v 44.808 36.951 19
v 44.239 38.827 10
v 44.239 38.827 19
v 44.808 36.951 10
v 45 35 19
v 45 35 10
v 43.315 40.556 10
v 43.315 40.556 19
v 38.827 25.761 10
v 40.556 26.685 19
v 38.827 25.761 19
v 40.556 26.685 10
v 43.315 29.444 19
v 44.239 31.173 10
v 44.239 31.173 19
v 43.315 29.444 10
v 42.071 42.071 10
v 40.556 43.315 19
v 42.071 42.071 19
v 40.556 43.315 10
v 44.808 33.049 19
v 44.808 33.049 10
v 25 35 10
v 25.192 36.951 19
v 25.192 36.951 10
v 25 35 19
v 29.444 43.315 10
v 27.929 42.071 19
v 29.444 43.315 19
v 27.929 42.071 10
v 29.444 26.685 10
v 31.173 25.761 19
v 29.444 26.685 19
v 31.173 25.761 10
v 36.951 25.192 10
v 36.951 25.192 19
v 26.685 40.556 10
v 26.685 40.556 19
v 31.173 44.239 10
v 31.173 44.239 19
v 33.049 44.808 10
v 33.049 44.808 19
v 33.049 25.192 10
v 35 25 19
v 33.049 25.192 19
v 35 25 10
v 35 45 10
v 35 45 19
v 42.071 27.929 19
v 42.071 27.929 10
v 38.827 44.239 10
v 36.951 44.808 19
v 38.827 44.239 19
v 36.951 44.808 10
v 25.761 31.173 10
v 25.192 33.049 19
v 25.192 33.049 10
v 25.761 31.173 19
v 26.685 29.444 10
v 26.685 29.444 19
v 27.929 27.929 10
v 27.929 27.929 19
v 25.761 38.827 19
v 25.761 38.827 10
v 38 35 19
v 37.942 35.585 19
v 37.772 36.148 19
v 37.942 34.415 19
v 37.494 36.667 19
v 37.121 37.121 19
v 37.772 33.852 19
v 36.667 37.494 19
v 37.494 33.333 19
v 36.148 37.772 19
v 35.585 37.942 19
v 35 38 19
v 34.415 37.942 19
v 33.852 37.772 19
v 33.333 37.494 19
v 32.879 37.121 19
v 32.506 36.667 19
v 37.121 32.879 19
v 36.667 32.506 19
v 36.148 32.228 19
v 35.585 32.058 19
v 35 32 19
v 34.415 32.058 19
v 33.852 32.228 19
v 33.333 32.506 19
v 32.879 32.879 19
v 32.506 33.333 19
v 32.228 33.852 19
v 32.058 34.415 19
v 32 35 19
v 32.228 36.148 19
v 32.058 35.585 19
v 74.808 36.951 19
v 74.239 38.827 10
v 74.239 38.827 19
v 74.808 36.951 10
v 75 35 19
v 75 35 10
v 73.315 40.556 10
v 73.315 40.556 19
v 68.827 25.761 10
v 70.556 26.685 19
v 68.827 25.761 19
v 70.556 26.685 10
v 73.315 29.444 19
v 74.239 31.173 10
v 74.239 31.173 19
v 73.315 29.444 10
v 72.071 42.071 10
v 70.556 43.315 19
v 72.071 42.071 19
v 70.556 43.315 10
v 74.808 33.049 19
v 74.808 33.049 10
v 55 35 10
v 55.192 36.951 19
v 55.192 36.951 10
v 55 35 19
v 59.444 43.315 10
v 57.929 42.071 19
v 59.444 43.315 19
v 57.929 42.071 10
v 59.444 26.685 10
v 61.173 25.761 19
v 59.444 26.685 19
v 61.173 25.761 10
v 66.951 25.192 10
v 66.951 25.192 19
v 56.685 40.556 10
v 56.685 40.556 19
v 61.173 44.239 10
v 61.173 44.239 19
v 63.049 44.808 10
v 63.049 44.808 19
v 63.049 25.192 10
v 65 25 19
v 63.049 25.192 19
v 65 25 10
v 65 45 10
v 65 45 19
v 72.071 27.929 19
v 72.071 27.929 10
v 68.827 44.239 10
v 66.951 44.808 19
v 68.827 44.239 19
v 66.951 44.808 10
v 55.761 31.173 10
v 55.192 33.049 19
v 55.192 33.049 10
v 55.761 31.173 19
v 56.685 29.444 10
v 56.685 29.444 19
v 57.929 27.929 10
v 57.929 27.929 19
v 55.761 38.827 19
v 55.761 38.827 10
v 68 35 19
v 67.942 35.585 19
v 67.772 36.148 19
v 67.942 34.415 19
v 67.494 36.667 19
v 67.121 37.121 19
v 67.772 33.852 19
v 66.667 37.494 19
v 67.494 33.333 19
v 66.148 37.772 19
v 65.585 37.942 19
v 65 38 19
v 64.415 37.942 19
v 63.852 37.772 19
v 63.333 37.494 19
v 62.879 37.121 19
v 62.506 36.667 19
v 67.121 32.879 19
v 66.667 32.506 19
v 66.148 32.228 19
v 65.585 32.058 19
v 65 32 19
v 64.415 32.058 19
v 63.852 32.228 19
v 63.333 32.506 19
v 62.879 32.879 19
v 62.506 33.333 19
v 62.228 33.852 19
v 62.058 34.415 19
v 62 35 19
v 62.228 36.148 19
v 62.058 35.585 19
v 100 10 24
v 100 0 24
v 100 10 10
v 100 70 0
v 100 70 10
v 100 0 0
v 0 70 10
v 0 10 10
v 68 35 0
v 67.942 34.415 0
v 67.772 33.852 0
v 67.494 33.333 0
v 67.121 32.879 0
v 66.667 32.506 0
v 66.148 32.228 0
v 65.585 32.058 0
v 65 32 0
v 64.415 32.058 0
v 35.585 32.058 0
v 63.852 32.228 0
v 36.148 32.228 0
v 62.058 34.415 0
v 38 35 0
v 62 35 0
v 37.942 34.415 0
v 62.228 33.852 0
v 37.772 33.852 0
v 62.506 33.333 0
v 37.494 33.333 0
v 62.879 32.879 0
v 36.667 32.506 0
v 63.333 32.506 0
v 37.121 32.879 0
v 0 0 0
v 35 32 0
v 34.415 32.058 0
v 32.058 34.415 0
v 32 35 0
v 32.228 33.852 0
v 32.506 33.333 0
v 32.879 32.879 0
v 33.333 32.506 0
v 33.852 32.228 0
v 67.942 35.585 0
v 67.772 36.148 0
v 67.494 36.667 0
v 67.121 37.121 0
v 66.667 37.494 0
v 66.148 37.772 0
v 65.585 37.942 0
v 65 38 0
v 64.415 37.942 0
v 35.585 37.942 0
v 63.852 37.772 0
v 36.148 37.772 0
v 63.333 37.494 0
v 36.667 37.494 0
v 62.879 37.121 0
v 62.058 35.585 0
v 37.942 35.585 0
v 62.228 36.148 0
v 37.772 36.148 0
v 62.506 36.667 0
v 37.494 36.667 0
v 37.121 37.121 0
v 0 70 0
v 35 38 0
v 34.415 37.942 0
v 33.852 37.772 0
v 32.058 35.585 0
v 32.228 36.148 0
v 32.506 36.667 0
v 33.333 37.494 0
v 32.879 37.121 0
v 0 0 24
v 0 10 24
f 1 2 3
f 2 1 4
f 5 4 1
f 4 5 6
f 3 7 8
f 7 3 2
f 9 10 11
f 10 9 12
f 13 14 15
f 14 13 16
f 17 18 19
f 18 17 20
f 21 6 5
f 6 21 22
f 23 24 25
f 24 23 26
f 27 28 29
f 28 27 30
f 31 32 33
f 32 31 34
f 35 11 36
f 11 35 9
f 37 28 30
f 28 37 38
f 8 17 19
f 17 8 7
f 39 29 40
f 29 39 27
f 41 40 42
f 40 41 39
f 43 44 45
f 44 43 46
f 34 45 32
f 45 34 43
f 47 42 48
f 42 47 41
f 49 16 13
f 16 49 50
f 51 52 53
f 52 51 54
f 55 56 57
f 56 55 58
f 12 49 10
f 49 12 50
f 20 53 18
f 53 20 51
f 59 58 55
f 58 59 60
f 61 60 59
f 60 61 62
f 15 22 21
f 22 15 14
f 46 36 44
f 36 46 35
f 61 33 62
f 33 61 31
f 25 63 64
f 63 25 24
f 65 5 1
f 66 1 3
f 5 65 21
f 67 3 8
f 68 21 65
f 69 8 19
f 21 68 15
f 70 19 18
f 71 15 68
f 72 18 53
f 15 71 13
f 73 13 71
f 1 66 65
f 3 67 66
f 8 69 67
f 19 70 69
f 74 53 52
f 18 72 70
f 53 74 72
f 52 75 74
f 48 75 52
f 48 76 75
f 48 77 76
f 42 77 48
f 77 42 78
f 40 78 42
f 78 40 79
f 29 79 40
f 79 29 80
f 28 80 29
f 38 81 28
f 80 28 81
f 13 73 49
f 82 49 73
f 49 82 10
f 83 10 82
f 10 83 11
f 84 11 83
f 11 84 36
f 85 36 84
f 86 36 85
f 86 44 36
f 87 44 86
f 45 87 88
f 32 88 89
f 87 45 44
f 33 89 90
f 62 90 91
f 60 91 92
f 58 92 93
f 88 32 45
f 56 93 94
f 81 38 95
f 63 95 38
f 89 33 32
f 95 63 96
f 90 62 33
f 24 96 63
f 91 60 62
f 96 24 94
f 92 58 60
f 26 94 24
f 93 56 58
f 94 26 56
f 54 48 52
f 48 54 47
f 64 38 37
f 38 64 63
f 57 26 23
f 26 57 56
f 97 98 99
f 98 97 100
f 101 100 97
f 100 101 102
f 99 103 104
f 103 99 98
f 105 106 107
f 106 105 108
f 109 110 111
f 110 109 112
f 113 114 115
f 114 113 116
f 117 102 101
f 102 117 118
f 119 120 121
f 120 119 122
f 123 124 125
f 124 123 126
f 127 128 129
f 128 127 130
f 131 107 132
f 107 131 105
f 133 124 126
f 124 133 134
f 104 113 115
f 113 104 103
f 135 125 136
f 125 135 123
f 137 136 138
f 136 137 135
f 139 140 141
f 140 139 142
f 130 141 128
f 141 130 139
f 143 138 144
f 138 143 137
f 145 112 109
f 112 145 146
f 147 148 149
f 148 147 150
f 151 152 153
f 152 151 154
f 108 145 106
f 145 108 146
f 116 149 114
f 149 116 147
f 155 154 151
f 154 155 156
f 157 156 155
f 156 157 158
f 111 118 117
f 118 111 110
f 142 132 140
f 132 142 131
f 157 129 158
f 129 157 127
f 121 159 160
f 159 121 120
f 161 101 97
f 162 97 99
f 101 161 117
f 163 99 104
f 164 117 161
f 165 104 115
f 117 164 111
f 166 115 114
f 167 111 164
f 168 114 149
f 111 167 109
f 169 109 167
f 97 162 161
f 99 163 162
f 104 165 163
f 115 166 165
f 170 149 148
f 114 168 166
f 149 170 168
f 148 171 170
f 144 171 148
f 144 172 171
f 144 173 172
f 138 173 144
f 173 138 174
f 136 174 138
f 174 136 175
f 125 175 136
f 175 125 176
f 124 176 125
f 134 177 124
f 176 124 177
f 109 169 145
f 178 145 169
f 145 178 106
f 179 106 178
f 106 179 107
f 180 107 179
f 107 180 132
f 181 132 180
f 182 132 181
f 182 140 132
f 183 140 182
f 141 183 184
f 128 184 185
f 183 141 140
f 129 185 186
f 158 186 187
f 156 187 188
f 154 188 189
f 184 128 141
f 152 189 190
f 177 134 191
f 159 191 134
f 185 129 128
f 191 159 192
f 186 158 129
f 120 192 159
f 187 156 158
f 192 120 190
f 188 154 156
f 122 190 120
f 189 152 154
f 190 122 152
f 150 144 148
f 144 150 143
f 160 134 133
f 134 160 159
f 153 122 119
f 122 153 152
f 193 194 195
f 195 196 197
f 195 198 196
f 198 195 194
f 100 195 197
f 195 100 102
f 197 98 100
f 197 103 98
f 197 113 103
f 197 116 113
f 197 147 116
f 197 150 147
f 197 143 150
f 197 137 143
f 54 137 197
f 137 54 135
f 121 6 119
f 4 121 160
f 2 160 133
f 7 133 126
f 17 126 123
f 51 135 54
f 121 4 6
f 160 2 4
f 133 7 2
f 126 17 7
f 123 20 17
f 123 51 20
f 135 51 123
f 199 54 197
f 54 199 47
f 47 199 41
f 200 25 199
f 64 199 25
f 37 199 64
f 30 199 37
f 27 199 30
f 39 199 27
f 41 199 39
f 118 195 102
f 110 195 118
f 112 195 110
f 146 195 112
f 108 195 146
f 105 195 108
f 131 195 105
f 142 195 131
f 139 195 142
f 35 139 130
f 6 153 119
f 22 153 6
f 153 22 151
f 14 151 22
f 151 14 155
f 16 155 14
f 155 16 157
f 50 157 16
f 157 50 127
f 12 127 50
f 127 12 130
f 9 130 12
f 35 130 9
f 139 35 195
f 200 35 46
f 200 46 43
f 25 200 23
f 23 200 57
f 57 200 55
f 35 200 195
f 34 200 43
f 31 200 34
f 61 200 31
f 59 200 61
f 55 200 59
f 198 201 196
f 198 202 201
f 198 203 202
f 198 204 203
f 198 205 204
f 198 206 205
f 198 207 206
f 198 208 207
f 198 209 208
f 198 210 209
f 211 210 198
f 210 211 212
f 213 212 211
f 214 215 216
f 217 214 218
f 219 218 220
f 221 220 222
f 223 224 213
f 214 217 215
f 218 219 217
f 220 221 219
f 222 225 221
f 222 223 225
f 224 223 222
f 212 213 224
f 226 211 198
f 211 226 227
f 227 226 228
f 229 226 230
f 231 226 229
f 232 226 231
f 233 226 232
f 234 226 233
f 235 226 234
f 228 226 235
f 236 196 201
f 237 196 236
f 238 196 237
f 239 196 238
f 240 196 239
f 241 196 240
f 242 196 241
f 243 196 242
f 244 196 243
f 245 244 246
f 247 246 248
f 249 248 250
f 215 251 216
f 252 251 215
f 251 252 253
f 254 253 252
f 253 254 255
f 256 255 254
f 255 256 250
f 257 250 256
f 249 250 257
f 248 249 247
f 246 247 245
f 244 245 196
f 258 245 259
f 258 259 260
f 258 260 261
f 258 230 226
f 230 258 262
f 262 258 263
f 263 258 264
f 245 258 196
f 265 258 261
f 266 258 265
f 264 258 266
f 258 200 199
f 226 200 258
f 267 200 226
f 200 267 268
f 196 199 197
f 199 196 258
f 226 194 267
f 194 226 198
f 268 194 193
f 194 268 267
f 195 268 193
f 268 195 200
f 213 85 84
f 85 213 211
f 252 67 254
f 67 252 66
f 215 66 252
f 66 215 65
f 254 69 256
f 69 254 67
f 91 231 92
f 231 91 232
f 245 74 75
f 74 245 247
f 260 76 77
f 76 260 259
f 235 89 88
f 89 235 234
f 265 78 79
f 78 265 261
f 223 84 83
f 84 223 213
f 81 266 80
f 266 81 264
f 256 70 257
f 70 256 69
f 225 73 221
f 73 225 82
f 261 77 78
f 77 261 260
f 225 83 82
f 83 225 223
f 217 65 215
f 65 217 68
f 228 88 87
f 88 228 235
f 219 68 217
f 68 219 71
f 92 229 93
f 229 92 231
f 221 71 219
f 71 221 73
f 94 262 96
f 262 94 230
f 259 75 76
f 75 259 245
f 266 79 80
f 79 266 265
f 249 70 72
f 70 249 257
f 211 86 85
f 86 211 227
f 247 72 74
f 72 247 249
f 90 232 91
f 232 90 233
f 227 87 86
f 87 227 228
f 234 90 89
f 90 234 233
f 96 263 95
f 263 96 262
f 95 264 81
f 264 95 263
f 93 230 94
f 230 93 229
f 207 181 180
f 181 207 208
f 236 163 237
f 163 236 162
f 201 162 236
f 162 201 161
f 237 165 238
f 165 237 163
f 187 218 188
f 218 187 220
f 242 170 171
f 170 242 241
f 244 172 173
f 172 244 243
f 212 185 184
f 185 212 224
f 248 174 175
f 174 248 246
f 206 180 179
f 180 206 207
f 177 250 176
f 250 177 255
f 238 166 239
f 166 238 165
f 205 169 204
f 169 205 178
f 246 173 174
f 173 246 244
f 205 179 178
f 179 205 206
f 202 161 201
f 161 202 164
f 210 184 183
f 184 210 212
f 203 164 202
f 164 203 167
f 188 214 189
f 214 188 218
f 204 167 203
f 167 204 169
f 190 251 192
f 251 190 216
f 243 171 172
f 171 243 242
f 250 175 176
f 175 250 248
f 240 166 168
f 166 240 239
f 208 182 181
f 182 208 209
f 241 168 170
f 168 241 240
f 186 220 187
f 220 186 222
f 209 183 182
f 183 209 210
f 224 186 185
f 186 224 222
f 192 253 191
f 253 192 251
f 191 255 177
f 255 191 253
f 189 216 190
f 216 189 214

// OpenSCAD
$fn = 32;

// ----------------------------------------------------------------------
// Drill jig: fence jig
// ----------------------------------------------------------------------

// --- parameters (mm) ---
plate_l = 100;            // plate length, X
plate_w = 70;             // plate width, Y
plate_t = 10;             // plate thickness
boss_d = 20;              // guide boss diameter
boss_h = 10;              // boss height above the plate
guide_d = 6;              // guide hole diameter
boss_pitch = 30;          // boss pitch
fence_h = 15;             // fence height above the plate
fence_t = 10;             // fence thickness
fit_tol = 0.02;           // tolerance for press fits, mm
free_tol = 0.2;           // tolerance for clearance fits, mm

n_boss = 2;  // guide bosses
boss_x0 = (plate_l - (n_boss - 1) * boss_pitch) / 2;  // first boss X
boss_top = plate_t - 1 + boss_h;  // boss crown height
fence_top = plate_t - 1 + fence_h;  // fence crown height
total_h = max([fence_top, boss_top]);  // overall height

difference() {
  union() {
  cube([plate_l, plate_w, plate_t]);
  for (i = [0 : n_boss - 1])
    translate([boss_x0 + i * boss_pitch, plate_w / 2, plate_t - 1])
      cylinder(h = boss_h, d = boss_d);
  translate([0, 0, plate_t - 1]) cube([plate_l, fence_t, fence_h]);
  }
  for (i = [0 : n_boss - 1])
    translate([boss_x0 + i * boss_pitch, plate_w / 2, -1])
      cylinder(h = plate_t + boss_h, d = guide_d);
}
